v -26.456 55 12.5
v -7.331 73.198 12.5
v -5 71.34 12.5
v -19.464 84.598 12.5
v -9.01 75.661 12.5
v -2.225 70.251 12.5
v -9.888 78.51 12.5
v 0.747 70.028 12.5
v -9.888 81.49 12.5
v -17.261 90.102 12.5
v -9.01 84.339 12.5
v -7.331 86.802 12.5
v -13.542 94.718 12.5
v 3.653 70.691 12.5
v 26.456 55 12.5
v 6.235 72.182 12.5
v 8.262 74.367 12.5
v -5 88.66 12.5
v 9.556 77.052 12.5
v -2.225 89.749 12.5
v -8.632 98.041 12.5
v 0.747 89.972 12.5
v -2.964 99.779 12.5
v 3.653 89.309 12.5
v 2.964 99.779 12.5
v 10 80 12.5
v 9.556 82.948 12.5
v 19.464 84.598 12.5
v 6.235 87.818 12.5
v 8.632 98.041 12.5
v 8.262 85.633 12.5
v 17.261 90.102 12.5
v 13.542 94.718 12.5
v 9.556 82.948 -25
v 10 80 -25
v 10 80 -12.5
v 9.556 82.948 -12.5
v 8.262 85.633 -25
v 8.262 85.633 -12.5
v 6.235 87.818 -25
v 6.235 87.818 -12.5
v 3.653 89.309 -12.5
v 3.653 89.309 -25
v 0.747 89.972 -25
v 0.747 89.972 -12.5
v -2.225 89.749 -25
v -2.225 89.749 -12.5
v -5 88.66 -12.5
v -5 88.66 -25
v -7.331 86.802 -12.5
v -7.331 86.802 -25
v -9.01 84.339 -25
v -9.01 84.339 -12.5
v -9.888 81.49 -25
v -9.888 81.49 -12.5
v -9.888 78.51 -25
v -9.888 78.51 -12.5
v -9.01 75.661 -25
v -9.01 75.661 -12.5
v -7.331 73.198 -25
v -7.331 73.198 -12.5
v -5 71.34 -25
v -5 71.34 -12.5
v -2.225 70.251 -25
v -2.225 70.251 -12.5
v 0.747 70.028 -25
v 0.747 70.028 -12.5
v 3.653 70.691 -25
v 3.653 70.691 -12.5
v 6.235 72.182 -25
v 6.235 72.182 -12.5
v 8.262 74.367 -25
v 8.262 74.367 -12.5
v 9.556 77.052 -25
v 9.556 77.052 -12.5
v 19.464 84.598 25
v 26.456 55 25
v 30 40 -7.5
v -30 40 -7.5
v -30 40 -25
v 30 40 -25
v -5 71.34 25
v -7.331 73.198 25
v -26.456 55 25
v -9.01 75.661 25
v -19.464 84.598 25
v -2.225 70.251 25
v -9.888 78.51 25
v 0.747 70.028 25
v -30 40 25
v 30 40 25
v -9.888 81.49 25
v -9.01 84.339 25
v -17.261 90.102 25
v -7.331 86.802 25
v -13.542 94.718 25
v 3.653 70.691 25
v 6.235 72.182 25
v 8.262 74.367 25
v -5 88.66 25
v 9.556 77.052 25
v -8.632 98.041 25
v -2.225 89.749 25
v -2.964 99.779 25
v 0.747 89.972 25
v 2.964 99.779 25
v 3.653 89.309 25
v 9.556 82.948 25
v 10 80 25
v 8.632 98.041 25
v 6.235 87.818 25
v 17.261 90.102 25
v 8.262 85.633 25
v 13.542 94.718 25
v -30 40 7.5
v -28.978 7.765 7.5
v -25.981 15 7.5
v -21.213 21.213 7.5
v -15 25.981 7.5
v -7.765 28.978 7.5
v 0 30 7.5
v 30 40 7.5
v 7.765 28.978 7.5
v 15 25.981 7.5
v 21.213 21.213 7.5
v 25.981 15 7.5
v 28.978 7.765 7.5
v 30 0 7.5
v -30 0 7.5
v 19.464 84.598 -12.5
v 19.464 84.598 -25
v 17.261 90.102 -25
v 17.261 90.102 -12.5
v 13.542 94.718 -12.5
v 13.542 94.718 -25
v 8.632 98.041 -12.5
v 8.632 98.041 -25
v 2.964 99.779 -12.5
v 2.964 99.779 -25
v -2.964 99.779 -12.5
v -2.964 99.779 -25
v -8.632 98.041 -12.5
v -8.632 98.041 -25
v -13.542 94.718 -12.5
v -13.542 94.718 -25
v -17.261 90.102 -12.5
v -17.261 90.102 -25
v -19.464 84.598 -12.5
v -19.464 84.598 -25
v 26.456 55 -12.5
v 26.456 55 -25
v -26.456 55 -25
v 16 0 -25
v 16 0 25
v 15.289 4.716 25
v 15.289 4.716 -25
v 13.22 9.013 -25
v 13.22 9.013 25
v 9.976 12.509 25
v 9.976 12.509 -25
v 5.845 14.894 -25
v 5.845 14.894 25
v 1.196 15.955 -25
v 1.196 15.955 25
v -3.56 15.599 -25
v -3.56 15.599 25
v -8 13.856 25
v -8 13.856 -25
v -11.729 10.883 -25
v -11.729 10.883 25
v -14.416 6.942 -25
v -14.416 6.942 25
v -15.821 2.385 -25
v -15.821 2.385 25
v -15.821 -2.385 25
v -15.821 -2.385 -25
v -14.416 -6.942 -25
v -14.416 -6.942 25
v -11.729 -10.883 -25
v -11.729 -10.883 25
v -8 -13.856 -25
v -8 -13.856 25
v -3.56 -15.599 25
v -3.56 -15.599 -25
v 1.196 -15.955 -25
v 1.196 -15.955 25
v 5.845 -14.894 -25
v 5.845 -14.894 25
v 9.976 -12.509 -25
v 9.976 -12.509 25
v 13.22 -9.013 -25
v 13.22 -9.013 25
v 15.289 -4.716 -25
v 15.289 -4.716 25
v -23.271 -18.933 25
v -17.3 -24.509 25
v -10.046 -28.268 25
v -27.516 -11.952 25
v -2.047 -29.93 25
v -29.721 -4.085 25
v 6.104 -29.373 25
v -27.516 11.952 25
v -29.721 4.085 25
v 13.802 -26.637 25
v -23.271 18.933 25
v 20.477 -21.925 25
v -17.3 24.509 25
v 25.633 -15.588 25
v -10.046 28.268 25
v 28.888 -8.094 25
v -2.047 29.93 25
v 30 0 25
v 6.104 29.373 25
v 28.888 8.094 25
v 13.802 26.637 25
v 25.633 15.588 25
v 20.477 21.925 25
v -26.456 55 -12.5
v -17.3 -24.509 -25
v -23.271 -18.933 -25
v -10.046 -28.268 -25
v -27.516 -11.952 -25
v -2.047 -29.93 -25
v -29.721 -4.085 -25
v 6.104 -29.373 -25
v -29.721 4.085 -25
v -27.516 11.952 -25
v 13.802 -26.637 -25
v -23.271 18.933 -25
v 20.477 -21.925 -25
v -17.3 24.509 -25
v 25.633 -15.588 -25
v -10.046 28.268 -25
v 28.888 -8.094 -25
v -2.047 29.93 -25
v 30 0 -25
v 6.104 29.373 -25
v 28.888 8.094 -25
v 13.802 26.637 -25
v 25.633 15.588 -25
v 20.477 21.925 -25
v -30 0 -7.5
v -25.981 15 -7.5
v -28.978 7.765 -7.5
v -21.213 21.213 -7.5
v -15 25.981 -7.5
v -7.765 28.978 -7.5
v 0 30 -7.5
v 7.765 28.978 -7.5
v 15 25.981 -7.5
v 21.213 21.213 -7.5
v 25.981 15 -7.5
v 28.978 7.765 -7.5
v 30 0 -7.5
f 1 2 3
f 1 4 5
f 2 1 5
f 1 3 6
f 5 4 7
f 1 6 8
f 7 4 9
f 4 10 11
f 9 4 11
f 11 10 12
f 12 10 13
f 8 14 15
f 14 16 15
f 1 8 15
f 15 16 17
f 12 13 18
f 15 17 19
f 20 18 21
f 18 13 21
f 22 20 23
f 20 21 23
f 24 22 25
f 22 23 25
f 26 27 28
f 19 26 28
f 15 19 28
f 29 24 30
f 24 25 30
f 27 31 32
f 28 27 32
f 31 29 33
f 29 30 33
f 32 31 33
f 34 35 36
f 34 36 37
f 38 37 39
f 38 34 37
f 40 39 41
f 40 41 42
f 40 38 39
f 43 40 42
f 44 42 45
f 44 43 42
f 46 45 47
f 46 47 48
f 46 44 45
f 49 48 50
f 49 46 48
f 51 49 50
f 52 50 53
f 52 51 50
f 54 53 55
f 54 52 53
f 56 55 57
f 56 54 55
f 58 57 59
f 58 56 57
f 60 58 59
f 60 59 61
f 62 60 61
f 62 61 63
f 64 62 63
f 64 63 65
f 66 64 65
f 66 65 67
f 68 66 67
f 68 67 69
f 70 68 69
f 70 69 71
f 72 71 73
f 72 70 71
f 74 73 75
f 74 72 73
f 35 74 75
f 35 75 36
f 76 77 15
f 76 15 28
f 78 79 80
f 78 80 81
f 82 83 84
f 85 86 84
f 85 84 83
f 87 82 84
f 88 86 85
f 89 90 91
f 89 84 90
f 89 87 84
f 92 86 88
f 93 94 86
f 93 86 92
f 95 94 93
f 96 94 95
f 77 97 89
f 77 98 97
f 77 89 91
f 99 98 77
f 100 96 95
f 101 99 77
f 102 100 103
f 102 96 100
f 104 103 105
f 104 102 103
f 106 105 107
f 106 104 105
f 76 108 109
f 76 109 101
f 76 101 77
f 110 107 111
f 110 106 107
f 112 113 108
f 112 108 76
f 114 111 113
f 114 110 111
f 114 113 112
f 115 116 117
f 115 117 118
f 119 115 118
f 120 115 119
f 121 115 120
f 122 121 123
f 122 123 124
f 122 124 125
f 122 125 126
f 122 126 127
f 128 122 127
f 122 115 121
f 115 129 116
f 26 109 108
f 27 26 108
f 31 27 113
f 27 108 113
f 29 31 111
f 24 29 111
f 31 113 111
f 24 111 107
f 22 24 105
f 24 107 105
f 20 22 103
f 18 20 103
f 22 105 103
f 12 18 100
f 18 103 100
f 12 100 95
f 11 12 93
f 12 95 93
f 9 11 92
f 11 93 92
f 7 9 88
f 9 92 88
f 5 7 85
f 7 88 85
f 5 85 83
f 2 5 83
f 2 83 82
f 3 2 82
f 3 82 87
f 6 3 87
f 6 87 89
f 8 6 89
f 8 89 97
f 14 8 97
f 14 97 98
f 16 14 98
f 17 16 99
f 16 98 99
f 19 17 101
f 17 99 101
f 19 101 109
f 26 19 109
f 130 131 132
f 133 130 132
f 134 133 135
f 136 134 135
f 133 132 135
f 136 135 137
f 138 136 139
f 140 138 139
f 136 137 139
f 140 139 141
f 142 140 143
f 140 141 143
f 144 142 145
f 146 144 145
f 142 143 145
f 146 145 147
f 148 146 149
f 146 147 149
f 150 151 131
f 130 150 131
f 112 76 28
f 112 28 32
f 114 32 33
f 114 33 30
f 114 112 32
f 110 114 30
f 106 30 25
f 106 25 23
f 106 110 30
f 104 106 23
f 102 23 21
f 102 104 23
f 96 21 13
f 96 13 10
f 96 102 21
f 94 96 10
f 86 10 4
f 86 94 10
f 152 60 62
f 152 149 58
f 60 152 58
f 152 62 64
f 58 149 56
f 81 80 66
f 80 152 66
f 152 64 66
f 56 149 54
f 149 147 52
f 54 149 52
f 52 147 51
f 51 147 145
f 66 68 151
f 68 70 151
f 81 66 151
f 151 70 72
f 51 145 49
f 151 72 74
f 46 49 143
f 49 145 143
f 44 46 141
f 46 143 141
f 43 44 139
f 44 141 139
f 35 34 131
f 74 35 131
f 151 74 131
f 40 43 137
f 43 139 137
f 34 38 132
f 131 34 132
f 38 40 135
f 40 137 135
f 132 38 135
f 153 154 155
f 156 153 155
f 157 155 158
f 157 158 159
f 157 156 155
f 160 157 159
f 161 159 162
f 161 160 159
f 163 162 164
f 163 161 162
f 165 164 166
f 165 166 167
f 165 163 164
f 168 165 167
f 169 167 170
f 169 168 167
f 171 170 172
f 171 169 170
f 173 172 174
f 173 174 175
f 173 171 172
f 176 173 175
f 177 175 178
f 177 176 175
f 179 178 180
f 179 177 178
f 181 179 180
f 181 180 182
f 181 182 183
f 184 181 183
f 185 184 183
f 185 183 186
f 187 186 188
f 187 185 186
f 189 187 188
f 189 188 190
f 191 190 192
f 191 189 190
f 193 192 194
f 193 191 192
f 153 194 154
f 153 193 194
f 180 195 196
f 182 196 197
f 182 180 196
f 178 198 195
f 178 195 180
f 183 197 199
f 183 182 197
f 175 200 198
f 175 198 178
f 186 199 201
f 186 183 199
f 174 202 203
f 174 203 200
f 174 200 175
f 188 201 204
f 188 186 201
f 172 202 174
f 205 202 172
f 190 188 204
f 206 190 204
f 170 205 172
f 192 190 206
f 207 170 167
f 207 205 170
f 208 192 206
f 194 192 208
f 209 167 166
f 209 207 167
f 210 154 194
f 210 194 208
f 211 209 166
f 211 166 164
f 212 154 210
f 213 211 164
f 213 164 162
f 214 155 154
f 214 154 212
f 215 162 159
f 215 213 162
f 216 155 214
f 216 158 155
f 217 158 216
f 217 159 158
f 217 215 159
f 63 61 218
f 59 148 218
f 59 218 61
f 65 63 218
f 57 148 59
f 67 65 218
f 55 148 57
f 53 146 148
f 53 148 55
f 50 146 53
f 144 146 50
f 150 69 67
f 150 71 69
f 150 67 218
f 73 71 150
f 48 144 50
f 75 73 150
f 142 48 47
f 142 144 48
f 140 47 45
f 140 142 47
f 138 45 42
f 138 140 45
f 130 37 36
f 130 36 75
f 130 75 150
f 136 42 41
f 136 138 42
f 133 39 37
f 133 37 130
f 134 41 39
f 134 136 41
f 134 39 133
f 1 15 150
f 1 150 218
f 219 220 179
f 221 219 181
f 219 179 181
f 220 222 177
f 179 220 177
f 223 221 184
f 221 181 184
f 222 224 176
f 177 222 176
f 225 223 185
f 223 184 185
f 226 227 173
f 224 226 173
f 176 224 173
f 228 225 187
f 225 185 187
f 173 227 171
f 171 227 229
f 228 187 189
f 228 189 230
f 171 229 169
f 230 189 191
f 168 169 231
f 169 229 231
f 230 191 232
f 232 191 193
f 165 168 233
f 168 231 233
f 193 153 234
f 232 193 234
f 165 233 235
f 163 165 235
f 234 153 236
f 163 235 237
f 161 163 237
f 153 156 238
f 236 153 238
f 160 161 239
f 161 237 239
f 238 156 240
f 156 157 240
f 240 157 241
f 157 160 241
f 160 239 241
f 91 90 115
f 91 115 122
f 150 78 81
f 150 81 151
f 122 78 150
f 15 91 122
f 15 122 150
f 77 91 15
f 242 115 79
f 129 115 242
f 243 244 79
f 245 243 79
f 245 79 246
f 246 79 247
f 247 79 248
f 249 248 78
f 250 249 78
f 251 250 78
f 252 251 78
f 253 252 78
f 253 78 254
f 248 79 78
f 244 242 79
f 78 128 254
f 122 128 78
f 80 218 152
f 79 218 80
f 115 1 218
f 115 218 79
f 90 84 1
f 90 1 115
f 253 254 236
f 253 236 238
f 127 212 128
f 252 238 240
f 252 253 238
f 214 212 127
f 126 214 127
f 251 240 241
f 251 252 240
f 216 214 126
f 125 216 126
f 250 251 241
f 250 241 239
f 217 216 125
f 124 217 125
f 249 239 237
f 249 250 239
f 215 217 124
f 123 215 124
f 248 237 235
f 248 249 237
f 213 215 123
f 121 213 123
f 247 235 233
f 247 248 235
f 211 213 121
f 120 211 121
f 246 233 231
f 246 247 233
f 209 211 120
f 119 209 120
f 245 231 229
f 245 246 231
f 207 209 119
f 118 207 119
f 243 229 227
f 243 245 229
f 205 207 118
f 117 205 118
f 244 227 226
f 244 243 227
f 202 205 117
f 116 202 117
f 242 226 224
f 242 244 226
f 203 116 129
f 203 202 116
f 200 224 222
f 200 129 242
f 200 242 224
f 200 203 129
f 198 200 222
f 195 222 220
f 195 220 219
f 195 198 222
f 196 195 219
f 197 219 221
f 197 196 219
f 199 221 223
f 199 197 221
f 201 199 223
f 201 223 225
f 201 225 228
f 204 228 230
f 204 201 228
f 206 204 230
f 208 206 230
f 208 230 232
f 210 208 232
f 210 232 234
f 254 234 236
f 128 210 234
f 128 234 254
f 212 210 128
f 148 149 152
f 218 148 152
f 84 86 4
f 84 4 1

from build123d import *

# Parameters (mm, degrees)
SKETCH1_R           = 30
SKETCH1_R_2         = 16
BOSS_EXTRUDE1_DEPTH = 25
BOSS_EXTRUDE5_DEPTH = 7.5
BOSS_EXTRUDE6_DEPTH = 50
SKETCH7_3_R         = 10
BOSS_EXTRUDE7_DEPTH = 12.5


with BuildPart() as part:
    # Sketch1 → Boss-Extrude1 (new, symmetric)
    with BuildSketch(Plane.XY):
        Circle(SKETCH1_R)
        Circle(SKETCH1_R_2, mode=Mode.SUBTRACT)
    extrude(amount=BOSS_EXTRUDE1_DEPTH, both=True)

    # Sketch2 → Boss-Extrude5 (add, symmetric)
    with BuildSketch(Plane.XY):
        with BuildLine():
            ThreePointArc((-30, 0), (0, 30), (30, 0))
            Line((30, 0), (30, 40))
            Line((30, 40), (-30, 40))
            Line((-30, 40), (-30, 0))
        make_face()
    extrude(amount=BOSS_EXTRUDE5_DEPTH, both=True)

    # Sketch7 → Boss-Extrude6 (add)
    with BuildSketch(Plane.XY.offset(25)):
        Polygon((-30, 40), (30, 40), (26.456439237, 55), (-26.456439237, 55), align=None)
    extrude(amount=-BOSS_EXTRUDE6_DEPTH)

    # Sketch7<3> → Boss-Extrude7 (add)
    with BuildSketch(Plane.XY.offset(25)):
        with BuildLine():
            Line((-19.464242224, 84.598181668), (-26.456439237, 55))
            Line((-26.456439237, 55), (26.456439237, 55))
            Line((26.456439237, 55), (19.464242224, 84.598181668))
            ThreePointArc((19.464242224, 84.598181668), (0, 100), (-19.464242224, 84.598181668))
        make_face()
        with Locations((0, 80)):
            Circle(SKETCH7_3_R, mode=Mode.SUBTRACT)
    boss_extrude7 = extrude(amount=-BOSS_EXTRUDE7_DEPTH)

    # Mirror2: Boss-Extrude7 across plane
    add(boss_extrude7.mirror(Plane.XY))


solid = part.part
